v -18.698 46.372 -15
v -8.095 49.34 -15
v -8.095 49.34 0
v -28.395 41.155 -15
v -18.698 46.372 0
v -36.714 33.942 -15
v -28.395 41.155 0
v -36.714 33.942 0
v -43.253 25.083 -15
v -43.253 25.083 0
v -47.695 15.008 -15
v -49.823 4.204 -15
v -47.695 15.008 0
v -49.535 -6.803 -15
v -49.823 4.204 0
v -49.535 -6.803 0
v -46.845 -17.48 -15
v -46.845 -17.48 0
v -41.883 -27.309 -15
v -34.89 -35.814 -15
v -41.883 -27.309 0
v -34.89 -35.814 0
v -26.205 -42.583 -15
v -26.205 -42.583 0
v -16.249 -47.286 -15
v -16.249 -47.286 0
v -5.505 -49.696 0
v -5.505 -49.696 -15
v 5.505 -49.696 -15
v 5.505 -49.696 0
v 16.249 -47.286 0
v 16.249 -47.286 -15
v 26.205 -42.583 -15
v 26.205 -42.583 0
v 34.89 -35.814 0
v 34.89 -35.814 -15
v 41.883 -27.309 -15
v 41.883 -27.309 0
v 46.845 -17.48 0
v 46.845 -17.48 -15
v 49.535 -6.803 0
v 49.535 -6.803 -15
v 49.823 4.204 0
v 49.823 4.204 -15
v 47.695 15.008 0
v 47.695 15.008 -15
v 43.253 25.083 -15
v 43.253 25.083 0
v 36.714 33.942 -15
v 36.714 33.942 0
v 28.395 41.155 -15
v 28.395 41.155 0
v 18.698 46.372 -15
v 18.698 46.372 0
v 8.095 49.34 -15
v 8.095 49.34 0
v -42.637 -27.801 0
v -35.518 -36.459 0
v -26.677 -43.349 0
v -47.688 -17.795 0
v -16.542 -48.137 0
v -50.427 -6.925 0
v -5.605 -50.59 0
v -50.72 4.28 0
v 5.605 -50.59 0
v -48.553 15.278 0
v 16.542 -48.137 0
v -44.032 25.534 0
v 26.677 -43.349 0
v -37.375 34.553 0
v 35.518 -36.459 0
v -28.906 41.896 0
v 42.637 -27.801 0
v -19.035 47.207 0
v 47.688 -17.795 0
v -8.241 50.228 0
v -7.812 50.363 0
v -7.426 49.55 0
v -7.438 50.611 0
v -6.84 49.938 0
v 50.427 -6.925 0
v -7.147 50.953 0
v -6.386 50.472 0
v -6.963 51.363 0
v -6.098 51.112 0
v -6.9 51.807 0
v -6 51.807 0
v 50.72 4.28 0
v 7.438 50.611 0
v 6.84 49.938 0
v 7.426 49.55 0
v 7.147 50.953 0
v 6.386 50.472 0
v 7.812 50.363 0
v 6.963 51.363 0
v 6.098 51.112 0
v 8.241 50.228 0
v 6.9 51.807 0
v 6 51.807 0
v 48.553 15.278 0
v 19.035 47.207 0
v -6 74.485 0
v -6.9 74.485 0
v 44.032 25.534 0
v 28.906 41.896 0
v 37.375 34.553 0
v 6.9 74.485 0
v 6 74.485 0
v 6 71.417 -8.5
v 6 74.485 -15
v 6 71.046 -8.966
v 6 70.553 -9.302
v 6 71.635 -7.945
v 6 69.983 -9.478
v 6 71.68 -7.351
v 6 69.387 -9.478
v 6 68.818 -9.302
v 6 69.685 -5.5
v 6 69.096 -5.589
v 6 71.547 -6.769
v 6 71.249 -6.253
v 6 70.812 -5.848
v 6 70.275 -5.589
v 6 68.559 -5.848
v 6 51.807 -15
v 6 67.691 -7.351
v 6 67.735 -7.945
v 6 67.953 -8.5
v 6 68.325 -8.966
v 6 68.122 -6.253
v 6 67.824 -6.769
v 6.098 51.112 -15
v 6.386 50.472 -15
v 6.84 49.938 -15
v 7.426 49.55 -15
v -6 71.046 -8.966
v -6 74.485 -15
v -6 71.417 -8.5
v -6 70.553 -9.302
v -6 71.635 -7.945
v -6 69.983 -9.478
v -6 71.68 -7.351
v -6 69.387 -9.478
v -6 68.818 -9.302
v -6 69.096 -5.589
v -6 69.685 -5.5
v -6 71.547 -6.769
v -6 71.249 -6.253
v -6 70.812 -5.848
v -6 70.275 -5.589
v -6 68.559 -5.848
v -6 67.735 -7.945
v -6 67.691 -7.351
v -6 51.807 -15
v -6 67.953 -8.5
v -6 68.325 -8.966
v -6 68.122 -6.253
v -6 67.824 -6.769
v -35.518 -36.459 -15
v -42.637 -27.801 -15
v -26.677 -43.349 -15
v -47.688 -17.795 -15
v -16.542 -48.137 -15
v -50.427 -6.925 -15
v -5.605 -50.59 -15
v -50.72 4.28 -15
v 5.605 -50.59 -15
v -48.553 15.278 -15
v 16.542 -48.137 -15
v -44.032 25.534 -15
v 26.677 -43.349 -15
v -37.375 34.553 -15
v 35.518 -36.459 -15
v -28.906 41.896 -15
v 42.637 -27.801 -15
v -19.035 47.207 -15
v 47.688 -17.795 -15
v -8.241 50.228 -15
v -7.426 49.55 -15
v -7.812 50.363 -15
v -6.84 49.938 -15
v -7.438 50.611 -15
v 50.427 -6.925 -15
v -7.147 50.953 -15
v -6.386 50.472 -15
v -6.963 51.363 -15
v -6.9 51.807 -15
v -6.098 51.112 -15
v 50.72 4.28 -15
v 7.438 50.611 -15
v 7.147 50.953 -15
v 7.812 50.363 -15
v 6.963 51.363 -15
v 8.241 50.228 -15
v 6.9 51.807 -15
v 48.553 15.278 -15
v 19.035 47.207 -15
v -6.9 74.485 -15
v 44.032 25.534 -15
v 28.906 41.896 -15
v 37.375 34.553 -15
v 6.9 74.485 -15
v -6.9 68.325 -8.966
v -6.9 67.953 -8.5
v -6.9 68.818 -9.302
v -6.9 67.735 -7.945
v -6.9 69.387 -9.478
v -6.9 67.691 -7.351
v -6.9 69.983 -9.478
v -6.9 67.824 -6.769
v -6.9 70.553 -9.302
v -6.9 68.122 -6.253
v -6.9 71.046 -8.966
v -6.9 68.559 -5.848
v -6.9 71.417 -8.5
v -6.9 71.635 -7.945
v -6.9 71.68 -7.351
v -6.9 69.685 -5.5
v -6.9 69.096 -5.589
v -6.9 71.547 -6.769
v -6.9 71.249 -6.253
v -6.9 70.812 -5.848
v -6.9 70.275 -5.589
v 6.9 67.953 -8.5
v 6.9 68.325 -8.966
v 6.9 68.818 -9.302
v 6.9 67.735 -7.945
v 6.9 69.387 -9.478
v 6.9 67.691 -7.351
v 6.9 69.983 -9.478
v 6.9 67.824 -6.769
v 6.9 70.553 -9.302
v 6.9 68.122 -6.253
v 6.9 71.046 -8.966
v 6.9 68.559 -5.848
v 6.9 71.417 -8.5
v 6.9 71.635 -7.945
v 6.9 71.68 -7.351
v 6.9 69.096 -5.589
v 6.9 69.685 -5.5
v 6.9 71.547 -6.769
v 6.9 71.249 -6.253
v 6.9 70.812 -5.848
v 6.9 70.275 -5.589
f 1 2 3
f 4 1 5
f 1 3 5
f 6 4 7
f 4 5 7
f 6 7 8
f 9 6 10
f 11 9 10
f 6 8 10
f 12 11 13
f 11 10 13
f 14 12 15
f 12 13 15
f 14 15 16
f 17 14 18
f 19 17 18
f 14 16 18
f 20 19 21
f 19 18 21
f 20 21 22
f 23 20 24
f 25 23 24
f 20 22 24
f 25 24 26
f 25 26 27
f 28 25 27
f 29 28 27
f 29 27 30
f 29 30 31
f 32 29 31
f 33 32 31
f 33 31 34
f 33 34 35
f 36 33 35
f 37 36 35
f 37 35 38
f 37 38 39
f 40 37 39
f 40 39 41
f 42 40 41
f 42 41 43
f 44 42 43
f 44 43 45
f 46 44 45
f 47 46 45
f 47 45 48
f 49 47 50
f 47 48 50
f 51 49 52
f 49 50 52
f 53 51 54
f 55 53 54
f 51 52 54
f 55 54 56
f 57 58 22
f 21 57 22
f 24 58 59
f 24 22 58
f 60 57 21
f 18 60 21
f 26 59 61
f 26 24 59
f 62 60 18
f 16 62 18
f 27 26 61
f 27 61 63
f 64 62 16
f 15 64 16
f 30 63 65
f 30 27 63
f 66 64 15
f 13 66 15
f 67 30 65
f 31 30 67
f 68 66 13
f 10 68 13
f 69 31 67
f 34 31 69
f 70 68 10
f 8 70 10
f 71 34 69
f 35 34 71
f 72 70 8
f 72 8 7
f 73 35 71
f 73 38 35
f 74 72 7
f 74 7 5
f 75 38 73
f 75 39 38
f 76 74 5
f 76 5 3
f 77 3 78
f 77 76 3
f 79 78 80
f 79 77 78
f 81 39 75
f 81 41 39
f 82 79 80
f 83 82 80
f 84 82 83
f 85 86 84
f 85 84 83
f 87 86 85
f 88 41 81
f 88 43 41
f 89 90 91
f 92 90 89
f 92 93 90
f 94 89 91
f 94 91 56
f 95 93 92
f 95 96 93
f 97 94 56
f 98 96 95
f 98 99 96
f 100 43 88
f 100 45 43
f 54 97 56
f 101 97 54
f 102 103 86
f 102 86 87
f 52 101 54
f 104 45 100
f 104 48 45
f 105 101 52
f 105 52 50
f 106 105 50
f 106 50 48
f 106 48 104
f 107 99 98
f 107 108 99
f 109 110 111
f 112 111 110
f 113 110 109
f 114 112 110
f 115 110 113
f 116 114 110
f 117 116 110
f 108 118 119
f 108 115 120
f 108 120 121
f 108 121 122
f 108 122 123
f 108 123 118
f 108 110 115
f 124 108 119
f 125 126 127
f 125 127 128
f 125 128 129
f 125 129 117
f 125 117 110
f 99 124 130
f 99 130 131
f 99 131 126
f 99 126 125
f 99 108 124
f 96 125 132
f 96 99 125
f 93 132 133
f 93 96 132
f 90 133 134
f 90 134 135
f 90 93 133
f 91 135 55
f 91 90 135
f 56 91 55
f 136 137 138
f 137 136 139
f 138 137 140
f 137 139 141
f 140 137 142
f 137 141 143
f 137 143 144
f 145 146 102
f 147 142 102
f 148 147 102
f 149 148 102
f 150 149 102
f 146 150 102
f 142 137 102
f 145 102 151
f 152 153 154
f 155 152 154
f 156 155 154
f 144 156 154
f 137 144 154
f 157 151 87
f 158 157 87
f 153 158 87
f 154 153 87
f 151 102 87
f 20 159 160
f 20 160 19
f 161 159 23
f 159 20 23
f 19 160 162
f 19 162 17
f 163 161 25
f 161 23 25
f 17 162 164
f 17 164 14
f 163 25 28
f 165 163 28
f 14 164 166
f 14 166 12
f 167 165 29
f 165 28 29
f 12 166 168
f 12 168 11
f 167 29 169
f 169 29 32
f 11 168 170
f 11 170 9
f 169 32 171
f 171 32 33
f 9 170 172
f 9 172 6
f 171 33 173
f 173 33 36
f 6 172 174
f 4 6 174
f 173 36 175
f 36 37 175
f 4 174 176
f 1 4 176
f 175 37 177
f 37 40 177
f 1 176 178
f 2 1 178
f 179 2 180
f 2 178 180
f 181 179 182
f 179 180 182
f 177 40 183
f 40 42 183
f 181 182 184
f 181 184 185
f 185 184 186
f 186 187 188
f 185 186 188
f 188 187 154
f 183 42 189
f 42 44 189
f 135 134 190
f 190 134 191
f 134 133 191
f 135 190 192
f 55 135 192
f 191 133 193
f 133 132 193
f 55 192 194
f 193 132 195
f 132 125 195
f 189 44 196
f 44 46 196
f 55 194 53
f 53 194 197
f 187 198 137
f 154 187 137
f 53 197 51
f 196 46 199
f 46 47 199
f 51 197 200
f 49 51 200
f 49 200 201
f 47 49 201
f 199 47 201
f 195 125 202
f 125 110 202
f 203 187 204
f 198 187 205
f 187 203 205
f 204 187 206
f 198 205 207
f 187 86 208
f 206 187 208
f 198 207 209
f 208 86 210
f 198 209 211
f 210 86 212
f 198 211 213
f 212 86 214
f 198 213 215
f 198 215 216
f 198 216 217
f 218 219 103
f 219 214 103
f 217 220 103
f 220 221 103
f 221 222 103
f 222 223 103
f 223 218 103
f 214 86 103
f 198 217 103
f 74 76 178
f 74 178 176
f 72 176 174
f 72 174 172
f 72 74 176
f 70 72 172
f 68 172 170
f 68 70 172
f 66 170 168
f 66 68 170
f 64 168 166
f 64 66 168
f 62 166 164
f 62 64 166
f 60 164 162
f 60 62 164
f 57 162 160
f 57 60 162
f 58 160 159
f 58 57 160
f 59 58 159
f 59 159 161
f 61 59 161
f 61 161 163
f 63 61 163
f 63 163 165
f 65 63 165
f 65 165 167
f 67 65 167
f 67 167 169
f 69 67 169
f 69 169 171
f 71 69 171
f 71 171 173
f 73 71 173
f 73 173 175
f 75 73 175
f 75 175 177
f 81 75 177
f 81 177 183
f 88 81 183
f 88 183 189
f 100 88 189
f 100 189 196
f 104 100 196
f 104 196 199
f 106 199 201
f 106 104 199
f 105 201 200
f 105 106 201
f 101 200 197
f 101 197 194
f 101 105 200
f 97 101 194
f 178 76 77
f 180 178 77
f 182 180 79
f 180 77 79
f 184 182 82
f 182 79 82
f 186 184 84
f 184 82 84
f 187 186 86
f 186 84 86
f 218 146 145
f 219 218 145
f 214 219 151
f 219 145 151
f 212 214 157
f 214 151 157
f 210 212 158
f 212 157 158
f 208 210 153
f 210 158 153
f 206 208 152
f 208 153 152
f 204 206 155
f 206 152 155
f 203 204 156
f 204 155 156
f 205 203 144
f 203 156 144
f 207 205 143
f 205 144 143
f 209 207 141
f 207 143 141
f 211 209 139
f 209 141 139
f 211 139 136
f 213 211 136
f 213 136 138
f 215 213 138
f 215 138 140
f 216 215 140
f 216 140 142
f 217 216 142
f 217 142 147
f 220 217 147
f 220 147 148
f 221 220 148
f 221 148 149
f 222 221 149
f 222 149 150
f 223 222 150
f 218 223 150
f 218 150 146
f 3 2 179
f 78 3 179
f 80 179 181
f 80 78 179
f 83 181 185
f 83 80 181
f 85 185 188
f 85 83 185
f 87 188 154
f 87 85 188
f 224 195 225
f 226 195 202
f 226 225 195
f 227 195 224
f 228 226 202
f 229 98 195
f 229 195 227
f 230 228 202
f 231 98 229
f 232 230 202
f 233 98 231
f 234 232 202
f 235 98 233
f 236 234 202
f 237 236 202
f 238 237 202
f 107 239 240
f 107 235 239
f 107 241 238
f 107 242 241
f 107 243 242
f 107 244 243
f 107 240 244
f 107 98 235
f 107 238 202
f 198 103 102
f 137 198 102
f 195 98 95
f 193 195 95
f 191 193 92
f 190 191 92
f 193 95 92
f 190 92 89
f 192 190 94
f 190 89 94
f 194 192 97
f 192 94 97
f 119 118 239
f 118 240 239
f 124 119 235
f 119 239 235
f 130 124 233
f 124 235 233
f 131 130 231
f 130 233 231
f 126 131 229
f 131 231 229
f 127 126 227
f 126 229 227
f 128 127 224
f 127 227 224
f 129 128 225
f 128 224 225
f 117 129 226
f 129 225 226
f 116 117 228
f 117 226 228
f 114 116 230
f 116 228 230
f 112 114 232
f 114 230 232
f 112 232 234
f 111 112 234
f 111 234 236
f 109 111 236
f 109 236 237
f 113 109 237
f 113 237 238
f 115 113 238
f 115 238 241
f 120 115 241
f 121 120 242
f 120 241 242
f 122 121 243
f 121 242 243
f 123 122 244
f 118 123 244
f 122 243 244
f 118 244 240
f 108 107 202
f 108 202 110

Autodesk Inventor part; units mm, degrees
ref_plane "YZ Plane" through (0, 0, 0) normal (1, 0, 0) x (0, 1, 0)
ref_plane "XZ Plane" through (0, 0, 0) normal (0, 1, 0) x (-1, 0, 0)
ref_plane "XY Plane" through (0, 0, 0) normal (0, 0, 1) x (1, 0, 0)
sketch "Sketch1" plane through (0, 0, 0) normal (0, 0, 1) x (1, 0, 0)
  line L0 (0, 0) -> (0, 19.8871) construction
  arc A0 (-8.0952, 49.3403) -> (8.0952, 49.3403) centre (0, 0) ccw
  arc A1 (-8.241, 50.2284) -> (8.241, 50.2284) centre (0, 0) ccw
  line L1 (-6, 74.4853) -> (-6, 51.8073)
  arc A2 (-8.0952, 49.3403) -> (-6, 51.8073) centre (-8.5, 51.8073) ccw
  arc A3 (-8.241, 50.2284) -> (-6.9, 51.8073) centre (-8.5, 51.8073) ccw
  line L2 (-6.9, 51.8073) -> (-6.9, 74.4853)
  line L3 (-6.9, 74.4853) -> (-6, 74.4853)
  line L4 (6, 74.4853) -> (6, 51.8073)
  arc A4 (6, 51.8073) -> (8.0952, 49.3403) centre (8.5, 51.8073) ccw
  arc A5 (6.9, 51.8073) -> (8.241, 50.2284) centre (8.5, 51.8073) ccw
  line L5 (6.9, 51.8073) -> (6.9, 74.4853)
  line L6 (6.9, 74.4853) -> (6, 74.4853)
  point P0 (-6.455, 50.3692)
  point P1 (6.455, 50.3692)
  dimension "d32" = 5
  dimension "d33" = 6
  dimension "d34" = 0.9
  dimension "d44" = 50
  dimension "d45" = 50.9
  dimension "d46" = 22.678
extrude "Extrusion1" add sketch "Sketch1" against normal blind 15
sketch "Sketch2" plane through (-6.9, 51.8073, 0) normal (-1, 0, 0) x (0, 0, 1)
  line L0 (0, 22.678) -> (-15, 22.678) projected
  line L1 (0, 22.678) -> (0, 0) projected
  point P0 (0, -51.8073)
  point P1 (-7.5, 17.878)
  dimension "d35" = 4.8
  dimension "d43" = 7.5
hole "Hole1" at (-6.9, 69.6853, -7.5) direction (1, 0, 0) diameter 4 depth 25 tip angle 137
properties part number "Banda de montaje"
